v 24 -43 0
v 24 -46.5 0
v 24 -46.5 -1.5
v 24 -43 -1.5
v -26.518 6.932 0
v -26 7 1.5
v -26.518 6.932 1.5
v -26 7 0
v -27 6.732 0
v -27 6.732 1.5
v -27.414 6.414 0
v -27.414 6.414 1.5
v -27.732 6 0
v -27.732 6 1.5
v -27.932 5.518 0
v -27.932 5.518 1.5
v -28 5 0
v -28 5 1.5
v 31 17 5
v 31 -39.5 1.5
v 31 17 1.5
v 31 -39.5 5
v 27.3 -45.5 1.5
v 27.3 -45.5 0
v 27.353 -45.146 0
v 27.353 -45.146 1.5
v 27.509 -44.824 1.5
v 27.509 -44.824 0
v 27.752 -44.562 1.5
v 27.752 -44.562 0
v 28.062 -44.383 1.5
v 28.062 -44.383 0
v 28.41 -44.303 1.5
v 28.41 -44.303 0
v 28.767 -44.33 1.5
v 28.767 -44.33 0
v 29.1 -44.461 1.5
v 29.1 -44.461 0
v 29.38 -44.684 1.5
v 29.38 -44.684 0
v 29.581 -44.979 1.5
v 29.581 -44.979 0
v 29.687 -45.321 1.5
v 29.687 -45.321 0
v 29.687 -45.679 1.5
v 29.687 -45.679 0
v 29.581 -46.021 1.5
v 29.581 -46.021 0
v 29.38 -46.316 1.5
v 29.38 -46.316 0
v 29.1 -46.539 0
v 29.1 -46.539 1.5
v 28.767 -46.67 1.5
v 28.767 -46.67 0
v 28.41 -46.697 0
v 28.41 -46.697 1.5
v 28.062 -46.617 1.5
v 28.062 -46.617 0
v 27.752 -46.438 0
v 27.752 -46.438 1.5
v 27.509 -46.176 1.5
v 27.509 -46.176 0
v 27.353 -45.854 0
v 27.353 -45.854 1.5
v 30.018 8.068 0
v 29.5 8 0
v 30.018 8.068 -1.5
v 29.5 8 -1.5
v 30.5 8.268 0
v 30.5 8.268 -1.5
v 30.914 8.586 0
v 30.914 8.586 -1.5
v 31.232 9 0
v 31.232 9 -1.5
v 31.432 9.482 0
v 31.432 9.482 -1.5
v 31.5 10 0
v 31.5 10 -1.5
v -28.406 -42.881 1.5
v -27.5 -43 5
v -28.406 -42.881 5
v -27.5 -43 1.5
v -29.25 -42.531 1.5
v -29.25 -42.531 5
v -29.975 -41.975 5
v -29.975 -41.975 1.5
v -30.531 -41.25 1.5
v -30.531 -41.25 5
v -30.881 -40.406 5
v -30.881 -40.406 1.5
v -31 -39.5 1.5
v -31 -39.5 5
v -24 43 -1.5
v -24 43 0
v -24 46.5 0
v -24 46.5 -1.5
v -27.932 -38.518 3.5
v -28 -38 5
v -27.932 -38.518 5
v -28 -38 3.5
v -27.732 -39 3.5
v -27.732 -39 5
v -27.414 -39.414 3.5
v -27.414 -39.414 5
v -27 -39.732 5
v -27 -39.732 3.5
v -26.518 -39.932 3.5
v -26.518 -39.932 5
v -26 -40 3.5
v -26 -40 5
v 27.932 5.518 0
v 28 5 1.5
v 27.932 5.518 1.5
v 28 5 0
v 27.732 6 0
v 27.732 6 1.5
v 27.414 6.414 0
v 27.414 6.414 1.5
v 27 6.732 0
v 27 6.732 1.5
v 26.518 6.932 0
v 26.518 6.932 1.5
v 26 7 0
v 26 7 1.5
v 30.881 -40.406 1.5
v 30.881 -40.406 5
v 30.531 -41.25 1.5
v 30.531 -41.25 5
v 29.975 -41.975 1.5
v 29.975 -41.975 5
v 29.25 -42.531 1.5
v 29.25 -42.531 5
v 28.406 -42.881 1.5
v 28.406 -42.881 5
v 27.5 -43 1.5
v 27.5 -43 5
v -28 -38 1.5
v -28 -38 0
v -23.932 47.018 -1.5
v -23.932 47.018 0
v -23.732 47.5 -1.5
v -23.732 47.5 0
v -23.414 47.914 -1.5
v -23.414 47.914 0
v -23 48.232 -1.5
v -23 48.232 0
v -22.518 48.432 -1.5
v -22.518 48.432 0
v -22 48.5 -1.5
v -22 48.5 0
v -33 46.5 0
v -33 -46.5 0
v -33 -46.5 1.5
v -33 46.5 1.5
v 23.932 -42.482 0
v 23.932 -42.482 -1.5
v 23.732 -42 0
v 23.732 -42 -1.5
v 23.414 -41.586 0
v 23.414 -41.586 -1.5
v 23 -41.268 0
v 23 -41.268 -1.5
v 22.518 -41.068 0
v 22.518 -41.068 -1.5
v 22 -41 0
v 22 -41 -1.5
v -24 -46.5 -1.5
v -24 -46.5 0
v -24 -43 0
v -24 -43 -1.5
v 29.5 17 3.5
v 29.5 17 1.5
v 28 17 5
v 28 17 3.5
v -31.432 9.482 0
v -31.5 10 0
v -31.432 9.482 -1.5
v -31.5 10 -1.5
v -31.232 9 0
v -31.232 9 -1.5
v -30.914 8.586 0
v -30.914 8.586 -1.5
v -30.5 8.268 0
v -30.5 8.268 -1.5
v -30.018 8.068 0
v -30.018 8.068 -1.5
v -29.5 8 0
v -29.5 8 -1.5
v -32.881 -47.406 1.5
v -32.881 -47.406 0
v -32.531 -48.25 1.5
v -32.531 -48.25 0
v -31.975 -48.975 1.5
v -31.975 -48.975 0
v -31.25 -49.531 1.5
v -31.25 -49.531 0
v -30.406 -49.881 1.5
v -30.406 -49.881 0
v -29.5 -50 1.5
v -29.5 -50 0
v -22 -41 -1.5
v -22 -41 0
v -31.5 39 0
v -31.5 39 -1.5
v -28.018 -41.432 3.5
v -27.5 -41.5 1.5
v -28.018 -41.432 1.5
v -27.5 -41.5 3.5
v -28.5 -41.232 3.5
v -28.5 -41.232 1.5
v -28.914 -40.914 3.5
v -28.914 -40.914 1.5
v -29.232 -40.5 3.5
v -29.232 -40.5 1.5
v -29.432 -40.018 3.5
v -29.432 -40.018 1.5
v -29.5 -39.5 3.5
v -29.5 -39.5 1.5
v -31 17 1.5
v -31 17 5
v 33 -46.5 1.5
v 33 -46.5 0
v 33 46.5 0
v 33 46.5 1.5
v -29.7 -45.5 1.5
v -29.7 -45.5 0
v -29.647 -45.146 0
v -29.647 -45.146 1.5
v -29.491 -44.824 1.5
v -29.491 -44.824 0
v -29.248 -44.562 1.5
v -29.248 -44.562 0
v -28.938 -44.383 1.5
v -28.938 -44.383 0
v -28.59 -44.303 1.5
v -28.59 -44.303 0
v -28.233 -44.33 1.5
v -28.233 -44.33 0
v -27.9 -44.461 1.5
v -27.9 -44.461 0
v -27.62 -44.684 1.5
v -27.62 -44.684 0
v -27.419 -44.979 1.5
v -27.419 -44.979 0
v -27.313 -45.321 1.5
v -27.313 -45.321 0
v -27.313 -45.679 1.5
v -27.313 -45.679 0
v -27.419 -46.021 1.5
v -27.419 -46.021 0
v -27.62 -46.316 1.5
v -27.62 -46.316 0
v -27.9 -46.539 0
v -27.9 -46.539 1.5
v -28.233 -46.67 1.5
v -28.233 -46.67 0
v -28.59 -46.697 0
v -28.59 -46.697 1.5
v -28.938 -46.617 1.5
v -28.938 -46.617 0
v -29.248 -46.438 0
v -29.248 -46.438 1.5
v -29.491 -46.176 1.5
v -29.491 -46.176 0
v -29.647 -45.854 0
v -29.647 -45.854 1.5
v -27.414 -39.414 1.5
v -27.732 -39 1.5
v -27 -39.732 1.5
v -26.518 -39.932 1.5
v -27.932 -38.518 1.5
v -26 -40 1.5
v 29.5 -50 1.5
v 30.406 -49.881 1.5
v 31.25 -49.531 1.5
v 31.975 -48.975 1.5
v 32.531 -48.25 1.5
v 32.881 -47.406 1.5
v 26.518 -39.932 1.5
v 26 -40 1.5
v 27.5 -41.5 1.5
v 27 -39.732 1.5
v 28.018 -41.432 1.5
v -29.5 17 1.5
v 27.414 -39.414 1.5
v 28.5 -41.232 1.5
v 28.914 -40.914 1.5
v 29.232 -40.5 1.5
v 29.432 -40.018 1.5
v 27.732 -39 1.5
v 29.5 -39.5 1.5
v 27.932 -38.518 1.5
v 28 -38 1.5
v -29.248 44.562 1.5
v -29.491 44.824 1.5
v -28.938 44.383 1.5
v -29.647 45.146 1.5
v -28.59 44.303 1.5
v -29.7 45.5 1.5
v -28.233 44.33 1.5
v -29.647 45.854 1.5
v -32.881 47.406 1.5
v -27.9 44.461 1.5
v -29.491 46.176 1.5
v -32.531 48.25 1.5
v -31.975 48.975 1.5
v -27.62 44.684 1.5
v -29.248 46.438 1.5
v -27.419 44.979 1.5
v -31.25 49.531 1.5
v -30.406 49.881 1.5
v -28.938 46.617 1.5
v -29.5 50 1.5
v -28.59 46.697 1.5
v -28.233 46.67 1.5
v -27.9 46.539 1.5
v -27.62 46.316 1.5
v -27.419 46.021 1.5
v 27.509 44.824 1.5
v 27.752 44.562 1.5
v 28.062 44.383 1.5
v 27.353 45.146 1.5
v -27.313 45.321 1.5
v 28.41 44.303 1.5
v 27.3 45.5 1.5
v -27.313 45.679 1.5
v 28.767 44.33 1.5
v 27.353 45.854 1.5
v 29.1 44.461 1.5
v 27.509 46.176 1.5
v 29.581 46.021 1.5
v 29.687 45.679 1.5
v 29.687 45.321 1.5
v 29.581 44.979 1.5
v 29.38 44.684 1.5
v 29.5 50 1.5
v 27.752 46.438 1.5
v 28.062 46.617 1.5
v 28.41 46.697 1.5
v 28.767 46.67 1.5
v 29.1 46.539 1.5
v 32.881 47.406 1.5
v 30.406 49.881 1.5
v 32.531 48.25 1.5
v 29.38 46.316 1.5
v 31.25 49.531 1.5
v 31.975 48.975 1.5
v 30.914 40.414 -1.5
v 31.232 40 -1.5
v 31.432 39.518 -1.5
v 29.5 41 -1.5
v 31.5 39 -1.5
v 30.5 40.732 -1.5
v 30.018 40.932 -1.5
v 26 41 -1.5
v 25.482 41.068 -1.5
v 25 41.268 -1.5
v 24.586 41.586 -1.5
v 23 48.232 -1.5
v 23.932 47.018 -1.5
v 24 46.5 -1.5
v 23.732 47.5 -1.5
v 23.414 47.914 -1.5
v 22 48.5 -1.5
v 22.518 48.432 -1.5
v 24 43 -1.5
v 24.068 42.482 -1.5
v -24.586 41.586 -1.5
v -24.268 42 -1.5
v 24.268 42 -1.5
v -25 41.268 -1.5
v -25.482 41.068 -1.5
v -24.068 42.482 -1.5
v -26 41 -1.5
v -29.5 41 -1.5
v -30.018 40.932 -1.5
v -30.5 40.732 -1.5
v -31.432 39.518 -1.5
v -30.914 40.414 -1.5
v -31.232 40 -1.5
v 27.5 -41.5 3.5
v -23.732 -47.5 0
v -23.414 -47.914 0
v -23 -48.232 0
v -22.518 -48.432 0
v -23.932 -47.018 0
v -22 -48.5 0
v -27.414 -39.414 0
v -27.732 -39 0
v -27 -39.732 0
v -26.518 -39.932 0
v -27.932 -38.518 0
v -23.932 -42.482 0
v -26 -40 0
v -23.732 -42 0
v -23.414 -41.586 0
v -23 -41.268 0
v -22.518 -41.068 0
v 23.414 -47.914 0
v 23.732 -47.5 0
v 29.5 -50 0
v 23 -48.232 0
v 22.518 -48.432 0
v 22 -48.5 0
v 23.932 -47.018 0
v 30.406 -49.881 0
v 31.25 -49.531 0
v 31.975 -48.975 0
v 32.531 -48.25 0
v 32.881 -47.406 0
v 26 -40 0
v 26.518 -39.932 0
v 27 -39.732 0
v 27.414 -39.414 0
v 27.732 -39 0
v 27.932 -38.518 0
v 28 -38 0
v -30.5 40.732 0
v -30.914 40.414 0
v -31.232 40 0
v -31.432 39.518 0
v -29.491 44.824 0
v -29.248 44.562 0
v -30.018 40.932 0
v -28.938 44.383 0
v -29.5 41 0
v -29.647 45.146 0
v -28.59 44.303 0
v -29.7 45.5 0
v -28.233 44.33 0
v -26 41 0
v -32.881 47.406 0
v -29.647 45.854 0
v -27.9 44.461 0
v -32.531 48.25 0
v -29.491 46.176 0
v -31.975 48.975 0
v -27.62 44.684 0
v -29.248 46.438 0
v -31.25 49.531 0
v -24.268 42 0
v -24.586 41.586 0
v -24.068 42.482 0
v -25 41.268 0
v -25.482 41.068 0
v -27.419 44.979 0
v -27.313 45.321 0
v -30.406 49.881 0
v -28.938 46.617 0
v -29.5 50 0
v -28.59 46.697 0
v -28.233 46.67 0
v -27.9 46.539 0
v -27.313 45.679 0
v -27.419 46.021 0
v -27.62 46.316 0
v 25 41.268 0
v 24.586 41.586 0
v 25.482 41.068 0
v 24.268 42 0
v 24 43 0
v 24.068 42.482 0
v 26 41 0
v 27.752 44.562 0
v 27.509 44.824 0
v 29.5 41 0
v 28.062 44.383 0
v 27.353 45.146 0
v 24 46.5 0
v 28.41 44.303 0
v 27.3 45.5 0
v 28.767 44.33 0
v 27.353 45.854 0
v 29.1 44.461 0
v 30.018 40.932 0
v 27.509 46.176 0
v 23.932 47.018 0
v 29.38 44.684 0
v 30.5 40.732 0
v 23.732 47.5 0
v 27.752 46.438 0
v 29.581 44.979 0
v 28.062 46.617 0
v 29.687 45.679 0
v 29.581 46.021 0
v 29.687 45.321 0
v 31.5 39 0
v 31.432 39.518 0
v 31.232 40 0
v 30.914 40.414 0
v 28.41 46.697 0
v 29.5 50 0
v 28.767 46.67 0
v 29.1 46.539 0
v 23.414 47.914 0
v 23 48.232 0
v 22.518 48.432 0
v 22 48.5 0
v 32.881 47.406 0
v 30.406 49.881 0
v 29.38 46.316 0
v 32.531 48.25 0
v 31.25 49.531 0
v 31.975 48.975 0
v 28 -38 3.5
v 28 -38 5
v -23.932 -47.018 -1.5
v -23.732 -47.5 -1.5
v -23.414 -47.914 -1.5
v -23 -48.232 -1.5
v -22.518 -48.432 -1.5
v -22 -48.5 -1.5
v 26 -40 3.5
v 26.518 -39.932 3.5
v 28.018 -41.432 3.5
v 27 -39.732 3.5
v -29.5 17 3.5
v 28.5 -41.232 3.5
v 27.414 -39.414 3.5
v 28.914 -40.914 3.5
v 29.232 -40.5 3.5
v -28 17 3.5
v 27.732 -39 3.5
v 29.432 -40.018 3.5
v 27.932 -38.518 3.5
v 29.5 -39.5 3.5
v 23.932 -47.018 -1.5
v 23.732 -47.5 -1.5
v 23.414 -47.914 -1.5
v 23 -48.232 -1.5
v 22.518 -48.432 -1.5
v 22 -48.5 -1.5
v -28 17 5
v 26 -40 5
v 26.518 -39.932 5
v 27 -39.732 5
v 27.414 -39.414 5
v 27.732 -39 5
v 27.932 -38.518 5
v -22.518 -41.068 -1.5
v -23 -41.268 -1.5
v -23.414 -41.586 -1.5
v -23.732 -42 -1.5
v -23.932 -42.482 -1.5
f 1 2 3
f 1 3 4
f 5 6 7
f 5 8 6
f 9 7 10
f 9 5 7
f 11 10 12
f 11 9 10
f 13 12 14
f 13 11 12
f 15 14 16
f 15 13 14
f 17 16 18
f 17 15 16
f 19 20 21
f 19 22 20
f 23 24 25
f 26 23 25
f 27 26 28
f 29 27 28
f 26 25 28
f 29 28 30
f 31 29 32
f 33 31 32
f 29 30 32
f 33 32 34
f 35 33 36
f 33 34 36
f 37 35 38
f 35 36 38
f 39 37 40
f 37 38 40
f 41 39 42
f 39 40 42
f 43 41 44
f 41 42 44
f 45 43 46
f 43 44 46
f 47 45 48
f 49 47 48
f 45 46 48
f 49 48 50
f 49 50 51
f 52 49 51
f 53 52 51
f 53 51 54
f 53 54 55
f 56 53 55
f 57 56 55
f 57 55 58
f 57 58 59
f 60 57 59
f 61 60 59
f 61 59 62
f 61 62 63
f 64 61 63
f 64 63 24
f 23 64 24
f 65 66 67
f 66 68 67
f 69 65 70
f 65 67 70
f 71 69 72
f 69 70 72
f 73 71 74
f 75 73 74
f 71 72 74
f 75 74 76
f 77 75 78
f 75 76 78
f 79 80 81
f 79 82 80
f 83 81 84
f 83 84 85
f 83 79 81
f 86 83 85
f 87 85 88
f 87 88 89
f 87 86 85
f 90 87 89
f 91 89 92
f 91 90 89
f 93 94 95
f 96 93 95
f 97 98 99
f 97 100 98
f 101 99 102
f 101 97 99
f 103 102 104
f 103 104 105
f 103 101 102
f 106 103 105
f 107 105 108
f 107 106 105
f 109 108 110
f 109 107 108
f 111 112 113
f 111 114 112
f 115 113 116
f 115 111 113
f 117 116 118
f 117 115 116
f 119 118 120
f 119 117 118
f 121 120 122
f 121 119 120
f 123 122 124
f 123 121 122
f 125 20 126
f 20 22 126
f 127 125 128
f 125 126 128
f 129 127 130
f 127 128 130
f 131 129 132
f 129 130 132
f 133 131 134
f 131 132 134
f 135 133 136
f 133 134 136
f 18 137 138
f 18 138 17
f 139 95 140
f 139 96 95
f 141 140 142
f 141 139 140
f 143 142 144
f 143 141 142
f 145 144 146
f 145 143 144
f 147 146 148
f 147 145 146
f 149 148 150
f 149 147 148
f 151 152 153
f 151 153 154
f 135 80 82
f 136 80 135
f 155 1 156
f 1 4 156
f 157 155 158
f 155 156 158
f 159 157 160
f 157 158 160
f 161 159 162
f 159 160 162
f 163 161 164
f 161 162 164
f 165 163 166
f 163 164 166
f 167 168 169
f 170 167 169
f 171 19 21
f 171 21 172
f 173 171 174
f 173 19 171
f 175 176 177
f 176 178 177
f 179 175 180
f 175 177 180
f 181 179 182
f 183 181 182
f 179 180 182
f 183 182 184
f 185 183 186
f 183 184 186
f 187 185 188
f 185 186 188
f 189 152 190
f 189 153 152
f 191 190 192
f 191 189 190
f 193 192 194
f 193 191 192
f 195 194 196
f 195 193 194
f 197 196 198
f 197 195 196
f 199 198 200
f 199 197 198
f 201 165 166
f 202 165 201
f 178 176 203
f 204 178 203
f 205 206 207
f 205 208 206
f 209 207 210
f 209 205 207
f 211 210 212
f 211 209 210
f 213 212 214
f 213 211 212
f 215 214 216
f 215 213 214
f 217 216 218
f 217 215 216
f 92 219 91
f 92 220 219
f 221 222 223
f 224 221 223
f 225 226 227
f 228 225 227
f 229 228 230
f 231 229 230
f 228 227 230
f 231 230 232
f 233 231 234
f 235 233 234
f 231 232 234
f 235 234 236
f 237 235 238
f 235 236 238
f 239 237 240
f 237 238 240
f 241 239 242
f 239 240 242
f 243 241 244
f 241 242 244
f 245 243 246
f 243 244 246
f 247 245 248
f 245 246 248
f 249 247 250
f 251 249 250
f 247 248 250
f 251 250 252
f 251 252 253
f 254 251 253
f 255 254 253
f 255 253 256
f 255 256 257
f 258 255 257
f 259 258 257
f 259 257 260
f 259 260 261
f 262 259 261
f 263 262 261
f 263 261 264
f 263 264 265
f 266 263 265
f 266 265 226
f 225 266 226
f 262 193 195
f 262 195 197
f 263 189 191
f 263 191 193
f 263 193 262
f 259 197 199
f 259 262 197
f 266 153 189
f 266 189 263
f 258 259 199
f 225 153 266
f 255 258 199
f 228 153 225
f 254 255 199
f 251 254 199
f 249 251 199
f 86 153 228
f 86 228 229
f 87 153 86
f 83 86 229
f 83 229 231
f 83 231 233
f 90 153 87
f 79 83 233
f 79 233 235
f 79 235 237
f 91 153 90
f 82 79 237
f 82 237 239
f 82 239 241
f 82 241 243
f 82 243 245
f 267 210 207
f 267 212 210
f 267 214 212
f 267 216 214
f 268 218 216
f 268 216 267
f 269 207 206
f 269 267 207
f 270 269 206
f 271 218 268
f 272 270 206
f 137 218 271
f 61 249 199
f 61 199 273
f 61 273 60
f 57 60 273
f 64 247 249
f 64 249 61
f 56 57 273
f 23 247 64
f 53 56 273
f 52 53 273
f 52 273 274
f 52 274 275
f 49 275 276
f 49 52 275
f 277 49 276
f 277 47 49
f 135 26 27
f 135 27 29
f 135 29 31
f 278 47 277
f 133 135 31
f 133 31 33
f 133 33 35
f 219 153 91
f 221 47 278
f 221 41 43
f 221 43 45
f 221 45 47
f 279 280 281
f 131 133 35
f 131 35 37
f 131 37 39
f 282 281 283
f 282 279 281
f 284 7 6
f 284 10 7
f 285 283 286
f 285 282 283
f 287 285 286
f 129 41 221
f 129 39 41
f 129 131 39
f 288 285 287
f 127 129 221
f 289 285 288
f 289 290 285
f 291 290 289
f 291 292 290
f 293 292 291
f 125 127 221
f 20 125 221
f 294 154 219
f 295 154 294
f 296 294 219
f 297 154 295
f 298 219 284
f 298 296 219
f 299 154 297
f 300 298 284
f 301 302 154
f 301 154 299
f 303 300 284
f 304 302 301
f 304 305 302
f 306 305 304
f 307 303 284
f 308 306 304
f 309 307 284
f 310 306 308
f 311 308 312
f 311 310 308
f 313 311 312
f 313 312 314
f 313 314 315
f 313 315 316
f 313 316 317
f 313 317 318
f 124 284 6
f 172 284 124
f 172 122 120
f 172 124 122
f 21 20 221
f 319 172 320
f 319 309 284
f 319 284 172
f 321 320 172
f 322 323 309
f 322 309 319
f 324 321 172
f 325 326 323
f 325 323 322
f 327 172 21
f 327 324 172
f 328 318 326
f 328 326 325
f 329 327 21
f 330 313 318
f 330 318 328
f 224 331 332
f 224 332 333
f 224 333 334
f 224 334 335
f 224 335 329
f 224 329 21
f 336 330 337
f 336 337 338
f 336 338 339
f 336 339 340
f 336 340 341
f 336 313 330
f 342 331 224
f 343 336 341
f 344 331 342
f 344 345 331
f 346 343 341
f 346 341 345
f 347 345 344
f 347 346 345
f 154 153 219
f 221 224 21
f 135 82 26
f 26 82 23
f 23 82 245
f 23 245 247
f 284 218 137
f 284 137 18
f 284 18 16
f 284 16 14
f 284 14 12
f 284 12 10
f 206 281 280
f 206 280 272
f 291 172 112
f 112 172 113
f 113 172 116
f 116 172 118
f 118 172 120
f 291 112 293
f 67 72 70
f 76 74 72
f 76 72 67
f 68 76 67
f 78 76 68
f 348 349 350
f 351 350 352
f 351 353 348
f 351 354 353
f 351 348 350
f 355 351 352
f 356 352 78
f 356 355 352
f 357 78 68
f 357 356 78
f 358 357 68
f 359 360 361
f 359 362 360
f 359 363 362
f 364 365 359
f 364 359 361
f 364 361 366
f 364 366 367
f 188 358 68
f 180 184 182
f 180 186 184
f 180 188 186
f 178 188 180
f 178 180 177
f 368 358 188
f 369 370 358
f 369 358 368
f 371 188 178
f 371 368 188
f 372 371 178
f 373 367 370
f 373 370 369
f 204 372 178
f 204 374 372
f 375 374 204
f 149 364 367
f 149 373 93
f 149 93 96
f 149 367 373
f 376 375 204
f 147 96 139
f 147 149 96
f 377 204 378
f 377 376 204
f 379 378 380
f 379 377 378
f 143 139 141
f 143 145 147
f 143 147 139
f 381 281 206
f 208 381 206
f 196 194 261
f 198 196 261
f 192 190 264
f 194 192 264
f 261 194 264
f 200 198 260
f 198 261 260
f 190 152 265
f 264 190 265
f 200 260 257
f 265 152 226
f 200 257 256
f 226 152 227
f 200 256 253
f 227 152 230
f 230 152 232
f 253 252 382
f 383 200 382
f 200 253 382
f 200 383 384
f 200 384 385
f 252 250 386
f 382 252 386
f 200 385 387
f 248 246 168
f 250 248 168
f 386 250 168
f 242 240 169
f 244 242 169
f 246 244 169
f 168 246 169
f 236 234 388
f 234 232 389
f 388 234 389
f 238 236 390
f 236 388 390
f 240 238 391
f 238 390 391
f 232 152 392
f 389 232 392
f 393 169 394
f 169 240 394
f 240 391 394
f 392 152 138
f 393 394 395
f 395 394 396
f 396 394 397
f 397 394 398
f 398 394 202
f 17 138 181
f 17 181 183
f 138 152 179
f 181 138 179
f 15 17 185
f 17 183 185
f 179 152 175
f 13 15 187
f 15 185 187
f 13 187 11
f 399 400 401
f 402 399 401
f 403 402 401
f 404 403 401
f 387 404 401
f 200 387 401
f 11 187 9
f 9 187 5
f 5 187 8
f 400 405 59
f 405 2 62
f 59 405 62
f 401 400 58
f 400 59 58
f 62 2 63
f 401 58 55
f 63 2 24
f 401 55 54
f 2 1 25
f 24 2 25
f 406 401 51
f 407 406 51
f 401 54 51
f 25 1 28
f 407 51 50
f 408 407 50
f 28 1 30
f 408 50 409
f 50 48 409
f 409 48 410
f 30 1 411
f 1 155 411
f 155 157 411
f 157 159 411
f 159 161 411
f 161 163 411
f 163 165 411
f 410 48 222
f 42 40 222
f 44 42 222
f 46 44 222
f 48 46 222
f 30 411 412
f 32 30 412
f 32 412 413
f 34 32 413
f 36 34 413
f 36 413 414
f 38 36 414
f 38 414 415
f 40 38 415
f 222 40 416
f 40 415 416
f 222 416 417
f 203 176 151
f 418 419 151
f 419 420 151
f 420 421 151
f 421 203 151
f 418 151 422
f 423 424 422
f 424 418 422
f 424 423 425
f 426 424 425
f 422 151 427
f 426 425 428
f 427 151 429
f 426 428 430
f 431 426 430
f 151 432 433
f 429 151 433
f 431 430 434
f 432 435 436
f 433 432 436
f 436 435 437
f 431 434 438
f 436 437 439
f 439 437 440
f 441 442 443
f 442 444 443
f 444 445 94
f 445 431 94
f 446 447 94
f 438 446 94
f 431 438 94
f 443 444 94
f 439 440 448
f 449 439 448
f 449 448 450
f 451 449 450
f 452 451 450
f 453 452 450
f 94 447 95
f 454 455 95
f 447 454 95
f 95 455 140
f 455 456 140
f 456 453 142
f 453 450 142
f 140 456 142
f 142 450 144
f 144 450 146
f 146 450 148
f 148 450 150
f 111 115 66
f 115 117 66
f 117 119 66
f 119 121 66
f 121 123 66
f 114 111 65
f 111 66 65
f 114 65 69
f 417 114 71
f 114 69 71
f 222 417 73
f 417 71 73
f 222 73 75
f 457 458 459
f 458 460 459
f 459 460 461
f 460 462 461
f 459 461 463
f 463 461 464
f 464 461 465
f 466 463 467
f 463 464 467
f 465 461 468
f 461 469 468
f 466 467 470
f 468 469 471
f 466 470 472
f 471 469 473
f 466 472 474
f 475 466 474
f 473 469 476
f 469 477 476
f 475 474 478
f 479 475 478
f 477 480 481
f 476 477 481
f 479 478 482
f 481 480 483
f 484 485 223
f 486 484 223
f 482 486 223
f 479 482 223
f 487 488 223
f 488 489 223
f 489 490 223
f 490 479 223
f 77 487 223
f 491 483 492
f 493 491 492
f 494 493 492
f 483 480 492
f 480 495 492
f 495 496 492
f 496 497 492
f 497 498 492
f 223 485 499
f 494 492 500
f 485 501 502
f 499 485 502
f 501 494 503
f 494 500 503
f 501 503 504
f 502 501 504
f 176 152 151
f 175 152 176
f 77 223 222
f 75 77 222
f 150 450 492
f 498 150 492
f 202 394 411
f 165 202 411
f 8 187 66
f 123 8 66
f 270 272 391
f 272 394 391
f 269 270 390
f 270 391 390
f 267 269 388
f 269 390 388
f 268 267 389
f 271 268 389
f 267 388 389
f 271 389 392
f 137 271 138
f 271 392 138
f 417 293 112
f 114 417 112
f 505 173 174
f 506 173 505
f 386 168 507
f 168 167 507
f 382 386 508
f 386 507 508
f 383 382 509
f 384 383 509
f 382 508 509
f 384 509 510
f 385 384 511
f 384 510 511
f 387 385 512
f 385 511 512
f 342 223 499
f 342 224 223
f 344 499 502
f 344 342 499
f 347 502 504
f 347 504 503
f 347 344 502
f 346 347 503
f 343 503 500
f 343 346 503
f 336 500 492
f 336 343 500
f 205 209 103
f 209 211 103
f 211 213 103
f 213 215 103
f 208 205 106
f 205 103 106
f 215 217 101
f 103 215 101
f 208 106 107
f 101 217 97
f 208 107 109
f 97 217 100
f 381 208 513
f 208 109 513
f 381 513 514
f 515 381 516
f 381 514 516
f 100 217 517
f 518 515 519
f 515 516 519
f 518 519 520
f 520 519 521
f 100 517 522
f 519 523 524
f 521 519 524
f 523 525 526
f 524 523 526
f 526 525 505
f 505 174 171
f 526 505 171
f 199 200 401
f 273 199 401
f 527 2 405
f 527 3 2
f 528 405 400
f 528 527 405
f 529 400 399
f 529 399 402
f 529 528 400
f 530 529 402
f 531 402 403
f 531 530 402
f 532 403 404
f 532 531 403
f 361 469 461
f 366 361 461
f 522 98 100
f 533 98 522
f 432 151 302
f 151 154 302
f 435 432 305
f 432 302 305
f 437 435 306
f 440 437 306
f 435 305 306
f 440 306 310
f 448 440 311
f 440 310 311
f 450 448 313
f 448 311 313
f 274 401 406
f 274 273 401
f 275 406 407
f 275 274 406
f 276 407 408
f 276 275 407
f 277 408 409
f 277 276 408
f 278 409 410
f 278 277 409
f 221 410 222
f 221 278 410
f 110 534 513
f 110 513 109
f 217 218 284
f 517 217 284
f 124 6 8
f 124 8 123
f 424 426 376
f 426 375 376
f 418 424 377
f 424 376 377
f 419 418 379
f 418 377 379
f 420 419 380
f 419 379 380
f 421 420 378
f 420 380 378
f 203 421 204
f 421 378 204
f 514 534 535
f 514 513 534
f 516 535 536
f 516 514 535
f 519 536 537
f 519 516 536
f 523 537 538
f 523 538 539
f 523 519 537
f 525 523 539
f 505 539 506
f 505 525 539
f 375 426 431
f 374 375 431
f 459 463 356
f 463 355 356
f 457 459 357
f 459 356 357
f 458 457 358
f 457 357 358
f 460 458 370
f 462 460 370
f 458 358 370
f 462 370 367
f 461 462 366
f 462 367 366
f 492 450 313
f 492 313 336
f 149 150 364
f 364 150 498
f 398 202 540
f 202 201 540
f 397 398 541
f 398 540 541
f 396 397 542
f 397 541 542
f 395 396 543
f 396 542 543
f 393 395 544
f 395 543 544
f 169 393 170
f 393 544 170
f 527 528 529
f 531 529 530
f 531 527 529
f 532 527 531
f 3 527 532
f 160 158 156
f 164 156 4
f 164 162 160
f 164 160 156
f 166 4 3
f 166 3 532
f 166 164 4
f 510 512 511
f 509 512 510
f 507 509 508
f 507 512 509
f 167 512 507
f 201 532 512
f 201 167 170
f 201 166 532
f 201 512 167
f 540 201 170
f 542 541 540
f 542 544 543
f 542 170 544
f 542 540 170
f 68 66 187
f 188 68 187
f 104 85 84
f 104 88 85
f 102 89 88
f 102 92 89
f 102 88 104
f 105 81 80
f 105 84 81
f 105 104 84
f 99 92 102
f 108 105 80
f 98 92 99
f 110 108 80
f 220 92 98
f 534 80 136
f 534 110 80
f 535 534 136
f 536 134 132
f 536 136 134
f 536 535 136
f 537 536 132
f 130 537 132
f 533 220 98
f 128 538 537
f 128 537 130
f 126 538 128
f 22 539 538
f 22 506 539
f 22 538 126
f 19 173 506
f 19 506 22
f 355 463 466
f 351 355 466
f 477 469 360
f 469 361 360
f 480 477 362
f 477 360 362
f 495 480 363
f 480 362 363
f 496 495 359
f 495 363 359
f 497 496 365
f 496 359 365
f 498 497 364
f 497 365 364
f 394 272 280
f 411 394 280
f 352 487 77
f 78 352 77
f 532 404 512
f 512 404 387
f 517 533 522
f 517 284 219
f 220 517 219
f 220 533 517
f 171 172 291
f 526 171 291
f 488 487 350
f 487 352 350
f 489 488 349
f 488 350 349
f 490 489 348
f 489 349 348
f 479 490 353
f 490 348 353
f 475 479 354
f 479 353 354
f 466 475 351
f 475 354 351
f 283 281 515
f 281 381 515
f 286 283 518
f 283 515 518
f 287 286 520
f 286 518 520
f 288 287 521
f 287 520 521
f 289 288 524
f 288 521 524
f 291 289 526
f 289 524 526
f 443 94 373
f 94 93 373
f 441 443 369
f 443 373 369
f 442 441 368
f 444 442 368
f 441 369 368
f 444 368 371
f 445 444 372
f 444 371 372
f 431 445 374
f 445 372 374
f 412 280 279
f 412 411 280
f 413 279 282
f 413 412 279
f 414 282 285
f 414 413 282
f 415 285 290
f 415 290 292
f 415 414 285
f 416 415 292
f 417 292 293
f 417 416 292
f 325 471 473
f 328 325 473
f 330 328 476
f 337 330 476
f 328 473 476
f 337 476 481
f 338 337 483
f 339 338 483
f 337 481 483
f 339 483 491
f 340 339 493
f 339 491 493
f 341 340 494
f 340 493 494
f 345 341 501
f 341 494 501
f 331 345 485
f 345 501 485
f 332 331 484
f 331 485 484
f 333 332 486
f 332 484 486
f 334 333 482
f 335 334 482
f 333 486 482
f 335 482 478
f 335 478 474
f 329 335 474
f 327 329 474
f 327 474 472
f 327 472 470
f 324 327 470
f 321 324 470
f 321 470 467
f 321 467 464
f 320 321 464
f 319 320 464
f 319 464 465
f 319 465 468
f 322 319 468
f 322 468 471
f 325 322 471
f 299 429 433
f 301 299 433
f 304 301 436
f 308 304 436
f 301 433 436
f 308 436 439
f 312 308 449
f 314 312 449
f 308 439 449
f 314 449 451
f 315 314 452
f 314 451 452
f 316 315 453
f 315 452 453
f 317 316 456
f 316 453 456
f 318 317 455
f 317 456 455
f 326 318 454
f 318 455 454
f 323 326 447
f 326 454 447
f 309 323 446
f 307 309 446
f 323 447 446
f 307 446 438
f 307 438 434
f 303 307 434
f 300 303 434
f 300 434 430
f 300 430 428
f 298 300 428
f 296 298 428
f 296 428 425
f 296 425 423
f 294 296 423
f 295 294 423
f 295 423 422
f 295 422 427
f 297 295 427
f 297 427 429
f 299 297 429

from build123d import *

# Parameters (mm, degrees)
SKETCH_1_W          = 66
SKETCH_1_H          = 100
EXTRUDE_1_DEPTH     = 1.5
FILLET_1_R          = 3.5
SKETCH_2_W          = 56
SKETCH_2_H          = 47
CUT_EXTRUDE_1_DEPTH = 1.5
FILLET_2_R          = 2
EXTRUDE_2_DEPTH     = 2
FILLET_3_R          = 2
EXTRUDE_START       = 1.5
EXTRUDE_3_DEPTH     = 1.5
FILLET_4_R          = 2
FILLET_5_R          = 3.5
SKETCH_5_W          = 48
SKETCH_5_H          = 7.5
EXTRUDE_4_DEPTH     = 1.5
FILLET_6_R          = 2
HOLE_WIZARD_M21_D   = 2.4


with BuildPart() as part:
    # Эскиз1 → Бобышка-Вытянуть1 (new body)
    with BuildSketch(Plane.XY):
        Rectangle(SKETCH_1_W, SKETCH_1_H)
    extrude(amount=EXTRUDE_1_DEPTH)

    # Скругление1
    fillet_1_edges = [part.edges().sort_by_distance(p)[0] for p in [
        (-33, -50, 0.75),
        (-33, 50, 0.75),
        (33, 50, 0.75),
        (33, -50, 0.75),
    ]]
    fillet(fillet_1_edges, radius=FILLET_1_R)

    # Эскиз2 → Вырез-Вытянуть1 (cut)
    with BuildSketch(Plane.XY.offset(1.5)):
        with Locations((0, -16.5)):
            Rectangle(SKETCH_2_W, SKETCH_2_H)
    extrude(amount=-CUT_EXTRUDE_1_DEPTH, mode=Mode.SUBTRACT)

    # Скругление2
    fillet_2_edges = [part.edges().sort_by_distance(p)[0] for p in [
        (28, 7, 0.75),
        (28, -40, 0.75),
        (-28, -40, 0.75),
        (-28, 7, 0.75),
    ]]
    fillet(fillet_2_edges, radius=FILLET_2_R)

    # Эскиз3 → Бобышка-Вытянуть2 (add)
    with BuildSketch(Plane.XY.offset(1.5)):
        Polygon((29.5, -41.5), (-29.5, -41.5), (-29.5, 17), (-31, 17), (-31, -43), (31, -43), (31, 17), (29.5, 17), align=None)
    extrude(amount=EXTRUDE_2_DEPTH)

    # Скругление3
    fillet_3_edges = [part.edges().sort_by_distance(p)[0] for p in [
        (29.5, -41.5, 2.5),
        (-29.5, -41.5, 2.5),
    ]]
    fillet(fillet_3_edges, radius=FILLET_3_R)

    # Эскиз4 → Бобышка-Вытянуть3 (add)
    with BuildSketch(Plane.XY.offset(3.5).offset(EXTRUDE_START)):
        with BuildLine():
            Line((-31, -43), (31, -43))
            Line((31, -43), (31, 17))
            Line((31, 17), (29.5, 17))
            Line((29.5, 17), (29.5, -39.5))
            ThreePointArc((29.5, -39.5), (28.914213562, -40.914213562), (27.5, -41.5))
            Line((27.5, -41.5), (-27.5, -41.5))
            ThreePointArc((-27.5, -41.5), (-28.914213562, -40.914213562), (-29.5, -39.5))
            Line((-29.5, -39.5), (-29.5, 17))
            Line((-29.5, 17), (-31, 17))
            Line((-31, 17), (-31, -43))
        make_face()
        with BuildLine():
            Line((-28, 17), (-29.5, 17))
            Line((-29.5, 17), (-29.5, -39.5))
            ThreePointArc((-29.5, -39.5), (-28.914213562, -40.914213562), (-27.5, -41.5))
            Line((-27.5, -41.5), (27.5, -41.5))
            ThreePointArc((27.5, -41.5), (28.914213562, -40.914213562), (29.5, -39.5))
            Line((29.5, -39.5), (29.5, 17))
            Line((29.5, 17), (28, 17))
            Line((28, 17), (28, -40))
            Line((28, -40), (-28, -40))
            Line((-28, -40), (-28, 17))
        make_face()
    extrude(amount=-EXTRUDE_3_DEPTH)

    # Скругление4
    fillet_4_edges = [part.edges().sort_by_distance(p)[0] for p in [
        (28, -40, 4.25),
        (-28, -40, 4.25),
    ]]
    fillet(fillet_4_edges, radius=FILLET_4_R)

    # Скругление5
    fillet_5_edges = [part.edges().sort_by_distance(p)[0] for p in [
        (31, -43, 3.25),
        (-31, -43, 3.25),
    ]]
    fillet(fillet_5_edges, radius=FILLET_5_R)

    # Эскиз5 → Бобышка-Вытянуть4 (add)
    with BuildSketch(Plane(origin=(0, 0, 0), x_dir=(-1, 0, 0), z_dir=(0, 0, -1))):
        Polygon((24, 48.5), (-24, 48.5), (-24, 41), (-31.5, 41), (-31.5, 8), (31.5, 8), (31.5, 41), (24, 41), align=None)
        with Locations((0, -44.75)):
            Rectangle(SKETCH_5_W, SKETCH_5_H)
    extrude(amount=EXTRUDE_4_DEPTH)

    # Скругление6
    fillet_6_edges = [part.edges().sort_by_distance(p)[0] for p in [
        (-24, 48.5, -0.75),
        (24, 48.5, -0.75),
        (24, 41, -0.75),
        (31.5, 41, -0.75),
        (31.5, 8, -0.75),
        (-31.5, 8, -0.75),
        (-31.5, 41, -0.75),
        (-24, 41, -0.75),
        (-24, -48.5, -0.75),
        (-24, -41, -0.75),
        (24, -41, -0.75),
        (24, -48.5, -0.75),
    ]]
    fillet(fillet_6_edges, radius=FILLET_6_R)

    # Отверстие с зазором M21 (through all)
    with Locations(Plane.XY.offset(1.5)):
        with Locations((-28.5, 45.5), (28.5, 45.5), (28.5, -45.5), (-28.5, -45.5)):
            Hole(HOLE_WIZARD_M21_D / 2)


solid = part.part
